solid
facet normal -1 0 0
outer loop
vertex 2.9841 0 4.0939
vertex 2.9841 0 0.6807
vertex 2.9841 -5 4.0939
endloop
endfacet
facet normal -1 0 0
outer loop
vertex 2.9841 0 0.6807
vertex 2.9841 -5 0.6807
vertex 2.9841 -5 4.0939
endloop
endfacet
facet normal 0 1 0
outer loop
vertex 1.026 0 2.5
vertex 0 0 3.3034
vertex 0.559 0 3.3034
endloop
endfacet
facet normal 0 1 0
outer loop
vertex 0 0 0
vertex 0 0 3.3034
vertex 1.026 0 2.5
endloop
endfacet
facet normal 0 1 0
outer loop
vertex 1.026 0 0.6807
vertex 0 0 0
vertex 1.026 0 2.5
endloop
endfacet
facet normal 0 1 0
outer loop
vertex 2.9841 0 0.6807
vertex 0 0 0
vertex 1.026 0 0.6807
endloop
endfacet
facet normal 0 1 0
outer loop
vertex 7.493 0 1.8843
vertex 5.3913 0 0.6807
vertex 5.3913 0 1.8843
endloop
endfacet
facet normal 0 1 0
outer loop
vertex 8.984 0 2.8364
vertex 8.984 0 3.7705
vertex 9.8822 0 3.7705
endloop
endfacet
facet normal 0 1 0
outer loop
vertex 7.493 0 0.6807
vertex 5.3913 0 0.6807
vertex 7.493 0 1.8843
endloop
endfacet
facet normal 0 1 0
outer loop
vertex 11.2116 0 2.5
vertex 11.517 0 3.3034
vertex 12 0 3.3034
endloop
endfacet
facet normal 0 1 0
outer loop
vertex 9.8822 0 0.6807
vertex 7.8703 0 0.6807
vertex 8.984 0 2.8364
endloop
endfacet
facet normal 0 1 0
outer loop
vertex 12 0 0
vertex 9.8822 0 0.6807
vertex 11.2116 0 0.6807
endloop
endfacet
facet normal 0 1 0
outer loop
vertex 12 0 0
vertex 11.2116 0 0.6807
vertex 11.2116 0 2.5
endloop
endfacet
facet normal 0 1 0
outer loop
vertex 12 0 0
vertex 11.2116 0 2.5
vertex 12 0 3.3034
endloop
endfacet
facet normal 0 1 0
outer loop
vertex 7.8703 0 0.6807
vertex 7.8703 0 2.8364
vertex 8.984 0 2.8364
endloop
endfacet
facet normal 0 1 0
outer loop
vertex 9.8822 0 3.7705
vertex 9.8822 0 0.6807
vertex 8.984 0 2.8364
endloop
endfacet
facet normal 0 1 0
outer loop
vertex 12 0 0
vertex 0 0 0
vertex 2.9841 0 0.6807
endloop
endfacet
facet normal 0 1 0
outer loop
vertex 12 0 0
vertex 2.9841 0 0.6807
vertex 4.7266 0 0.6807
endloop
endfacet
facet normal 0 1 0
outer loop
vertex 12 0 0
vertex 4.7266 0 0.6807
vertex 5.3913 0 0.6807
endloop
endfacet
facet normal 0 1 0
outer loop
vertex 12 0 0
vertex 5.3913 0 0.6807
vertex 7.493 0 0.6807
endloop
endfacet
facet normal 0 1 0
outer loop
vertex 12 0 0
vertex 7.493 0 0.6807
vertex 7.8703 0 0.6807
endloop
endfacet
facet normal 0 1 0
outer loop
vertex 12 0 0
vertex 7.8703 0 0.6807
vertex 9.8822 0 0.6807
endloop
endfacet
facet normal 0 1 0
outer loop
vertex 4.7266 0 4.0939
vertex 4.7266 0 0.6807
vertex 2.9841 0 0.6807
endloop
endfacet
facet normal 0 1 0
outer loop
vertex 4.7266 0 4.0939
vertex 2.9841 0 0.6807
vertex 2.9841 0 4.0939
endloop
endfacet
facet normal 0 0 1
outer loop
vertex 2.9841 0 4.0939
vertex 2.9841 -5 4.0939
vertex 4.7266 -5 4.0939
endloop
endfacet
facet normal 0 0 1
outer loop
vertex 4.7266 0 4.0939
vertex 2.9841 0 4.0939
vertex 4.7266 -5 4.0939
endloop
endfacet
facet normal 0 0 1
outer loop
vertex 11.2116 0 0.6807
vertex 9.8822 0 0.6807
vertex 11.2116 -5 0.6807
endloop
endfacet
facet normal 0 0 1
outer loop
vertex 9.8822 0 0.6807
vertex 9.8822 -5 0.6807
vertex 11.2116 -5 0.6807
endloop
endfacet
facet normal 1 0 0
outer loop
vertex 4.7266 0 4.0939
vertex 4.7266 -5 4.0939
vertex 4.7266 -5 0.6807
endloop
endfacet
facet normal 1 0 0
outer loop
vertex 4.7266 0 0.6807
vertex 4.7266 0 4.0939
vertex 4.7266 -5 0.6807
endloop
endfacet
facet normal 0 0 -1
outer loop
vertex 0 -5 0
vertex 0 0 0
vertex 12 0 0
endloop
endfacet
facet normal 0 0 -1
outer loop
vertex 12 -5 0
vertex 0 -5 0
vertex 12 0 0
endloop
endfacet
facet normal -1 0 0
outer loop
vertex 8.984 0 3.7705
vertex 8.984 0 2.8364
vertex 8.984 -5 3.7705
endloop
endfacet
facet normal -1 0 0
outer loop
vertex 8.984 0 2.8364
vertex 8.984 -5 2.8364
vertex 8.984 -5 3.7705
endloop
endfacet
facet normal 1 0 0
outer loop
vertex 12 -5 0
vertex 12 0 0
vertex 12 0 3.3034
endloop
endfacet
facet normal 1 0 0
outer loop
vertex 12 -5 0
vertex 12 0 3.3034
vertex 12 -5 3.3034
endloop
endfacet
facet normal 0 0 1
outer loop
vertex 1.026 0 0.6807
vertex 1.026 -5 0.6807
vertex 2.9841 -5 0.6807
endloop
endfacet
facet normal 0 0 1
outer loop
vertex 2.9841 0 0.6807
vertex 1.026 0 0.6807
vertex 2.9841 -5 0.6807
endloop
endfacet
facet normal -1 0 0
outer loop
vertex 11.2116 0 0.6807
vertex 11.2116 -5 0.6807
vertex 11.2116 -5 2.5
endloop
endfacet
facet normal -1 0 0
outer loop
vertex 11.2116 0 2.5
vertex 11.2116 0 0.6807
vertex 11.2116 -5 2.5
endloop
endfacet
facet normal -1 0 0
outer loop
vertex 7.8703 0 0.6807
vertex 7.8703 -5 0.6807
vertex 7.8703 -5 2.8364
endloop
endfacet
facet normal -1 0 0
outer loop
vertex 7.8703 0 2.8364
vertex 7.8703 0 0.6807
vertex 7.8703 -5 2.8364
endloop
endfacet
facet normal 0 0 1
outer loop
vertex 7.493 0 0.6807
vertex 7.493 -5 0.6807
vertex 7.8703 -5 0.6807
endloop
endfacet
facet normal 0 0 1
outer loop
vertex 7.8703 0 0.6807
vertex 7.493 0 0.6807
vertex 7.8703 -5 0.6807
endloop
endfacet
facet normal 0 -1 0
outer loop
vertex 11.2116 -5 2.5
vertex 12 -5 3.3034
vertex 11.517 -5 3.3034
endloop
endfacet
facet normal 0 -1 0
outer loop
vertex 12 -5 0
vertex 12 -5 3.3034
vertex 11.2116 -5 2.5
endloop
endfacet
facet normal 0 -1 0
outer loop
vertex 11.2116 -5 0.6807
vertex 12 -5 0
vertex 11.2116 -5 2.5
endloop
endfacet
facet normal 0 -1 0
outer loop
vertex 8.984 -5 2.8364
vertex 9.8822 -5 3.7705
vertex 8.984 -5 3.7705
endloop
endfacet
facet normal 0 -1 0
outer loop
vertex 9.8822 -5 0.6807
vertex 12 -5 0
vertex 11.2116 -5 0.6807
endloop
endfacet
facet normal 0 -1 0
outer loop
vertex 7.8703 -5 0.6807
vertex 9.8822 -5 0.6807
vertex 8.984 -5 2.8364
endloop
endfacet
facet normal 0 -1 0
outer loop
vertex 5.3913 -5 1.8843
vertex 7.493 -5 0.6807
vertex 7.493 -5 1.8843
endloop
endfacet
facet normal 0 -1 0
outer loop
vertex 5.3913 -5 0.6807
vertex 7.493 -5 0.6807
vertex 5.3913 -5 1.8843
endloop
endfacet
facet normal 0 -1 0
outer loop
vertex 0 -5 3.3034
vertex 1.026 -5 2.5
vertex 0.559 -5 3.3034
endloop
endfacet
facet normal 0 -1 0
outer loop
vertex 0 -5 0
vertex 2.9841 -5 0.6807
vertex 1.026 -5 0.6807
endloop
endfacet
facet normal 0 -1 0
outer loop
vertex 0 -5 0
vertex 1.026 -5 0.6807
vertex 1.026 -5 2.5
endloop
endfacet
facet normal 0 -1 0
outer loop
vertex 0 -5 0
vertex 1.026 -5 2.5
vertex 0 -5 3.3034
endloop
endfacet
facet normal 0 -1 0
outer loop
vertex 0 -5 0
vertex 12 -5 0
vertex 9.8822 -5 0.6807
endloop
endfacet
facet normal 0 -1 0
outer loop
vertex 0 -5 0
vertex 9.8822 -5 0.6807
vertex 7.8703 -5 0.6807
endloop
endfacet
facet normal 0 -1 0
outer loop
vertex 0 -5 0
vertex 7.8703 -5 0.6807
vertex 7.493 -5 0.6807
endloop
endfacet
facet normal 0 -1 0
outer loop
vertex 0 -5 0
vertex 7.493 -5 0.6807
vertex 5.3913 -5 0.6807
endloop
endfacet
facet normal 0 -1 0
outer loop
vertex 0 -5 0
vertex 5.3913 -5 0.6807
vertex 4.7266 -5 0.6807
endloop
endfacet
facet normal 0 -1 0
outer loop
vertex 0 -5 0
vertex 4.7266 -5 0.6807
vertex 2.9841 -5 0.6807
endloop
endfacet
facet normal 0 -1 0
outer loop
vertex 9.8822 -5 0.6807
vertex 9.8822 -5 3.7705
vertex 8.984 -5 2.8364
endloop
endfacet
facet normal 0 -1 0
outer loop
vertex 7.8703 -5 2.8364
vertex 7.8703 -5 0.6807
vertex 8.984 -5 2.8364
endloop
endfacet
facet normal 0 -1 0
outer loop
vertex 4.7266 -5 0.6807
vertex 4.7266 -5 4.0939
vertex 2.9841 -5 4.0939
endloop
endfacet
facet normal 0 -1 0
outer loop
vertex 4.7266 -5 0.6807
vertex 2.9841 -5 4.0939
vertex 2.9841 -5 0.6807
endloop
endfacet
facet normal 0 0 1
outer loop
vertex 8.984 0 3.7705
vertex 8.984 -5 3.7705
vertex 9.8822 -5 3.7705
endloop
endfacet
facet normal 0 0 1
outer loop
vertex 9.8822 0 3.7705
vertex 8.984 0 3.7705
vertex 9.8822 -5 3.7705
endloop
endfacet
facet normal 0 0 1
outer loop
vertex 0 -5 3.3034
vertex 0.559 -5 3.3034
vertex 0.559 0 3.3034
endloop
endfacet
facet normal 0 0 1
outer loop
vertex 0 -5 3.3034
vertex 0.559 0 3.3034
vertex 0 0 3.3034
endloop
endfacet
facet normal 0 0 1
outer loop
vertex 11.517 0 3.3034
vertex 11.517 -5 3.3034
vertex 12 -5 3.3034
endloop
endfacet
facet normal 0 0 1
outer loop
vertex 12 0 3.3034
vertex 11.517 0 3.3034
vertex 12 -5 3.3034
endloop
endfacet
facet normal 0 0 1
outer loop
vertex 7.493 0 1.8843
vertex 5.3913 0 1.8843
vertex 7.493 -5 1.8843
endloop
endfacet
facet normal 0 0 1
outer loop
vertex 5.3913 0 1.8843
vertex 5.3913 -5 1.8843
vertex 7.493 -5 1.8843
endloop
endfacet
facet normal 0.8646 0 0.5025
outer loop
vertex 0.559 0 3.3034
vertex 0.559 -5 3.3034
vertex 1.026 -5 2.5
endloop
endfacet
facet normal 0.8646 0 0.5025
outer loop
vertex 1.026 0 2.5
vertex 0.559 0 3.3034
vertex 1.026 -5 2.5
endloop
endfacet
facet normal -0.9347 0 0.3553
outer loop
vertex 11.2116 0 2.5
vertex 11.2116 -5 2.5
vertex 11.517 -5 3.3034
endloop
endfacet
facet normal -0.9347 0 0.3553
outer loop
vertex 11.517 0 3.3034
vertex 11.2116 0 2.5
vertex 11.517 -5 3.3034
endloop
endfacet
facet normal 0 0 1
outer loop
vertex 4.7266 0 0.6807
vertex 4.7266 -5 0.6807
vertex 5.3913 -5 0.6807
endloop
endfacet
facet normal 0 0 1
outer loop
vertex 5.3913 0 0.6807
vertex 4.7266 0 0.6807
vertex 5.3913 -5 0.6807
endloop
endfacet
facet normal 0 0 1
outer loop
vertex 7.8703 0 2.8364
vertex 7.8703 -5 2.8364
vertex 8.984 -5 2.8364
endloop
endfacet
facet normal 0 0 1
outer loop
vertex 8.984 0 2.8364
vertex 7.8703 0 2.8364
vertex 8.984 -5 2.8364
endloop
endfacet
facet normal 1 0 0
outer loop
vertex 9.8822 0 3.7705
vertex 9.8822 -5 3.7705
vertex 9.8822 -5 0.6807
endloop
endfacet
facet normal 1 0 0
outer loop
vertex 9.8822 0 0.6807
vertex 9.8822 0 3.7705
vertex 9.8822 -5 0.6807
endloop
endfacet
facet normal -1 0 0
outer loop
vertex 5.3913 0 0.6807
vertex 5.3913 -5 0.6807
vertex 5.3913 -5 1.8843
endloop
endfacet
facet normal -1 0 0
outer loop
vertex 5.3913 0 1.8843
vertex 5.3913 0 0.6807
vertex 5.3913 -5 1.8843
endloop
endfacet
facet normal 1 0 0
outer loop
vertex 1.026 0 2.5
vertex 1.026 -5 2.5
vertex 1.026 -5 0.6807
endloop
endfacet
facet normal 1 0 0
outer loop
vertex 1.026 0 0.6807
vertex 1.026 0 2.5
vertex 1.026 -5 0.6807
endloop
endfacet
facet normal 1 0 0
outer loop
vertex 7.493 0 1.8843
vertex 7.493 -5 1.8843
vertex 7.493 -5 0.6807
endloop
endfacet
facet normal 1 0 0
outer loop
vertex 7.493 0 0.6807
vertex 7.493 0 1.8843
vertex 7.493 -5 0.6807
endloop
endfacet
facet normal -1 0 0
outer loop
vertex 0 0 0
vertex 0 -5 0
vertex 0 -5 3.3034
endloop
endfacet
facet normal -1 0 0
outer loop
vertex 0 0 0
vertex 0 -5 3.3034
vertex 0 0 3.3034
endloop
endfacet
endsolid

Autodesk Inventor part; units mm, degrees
ref_plane "YZ Plane" through (0, 0, 0) normal (1, 0, 0) x (0, 1, 0)
ref_plane "XZ Plane" through (0, 0, 0) normal (0, 1, 0) x (-1, 0, 0)
ref_plane "XY Plane" through (0, 0, 0) normal (0, 0, 1) x (1, 0, 0)
sketch "Эскиз1" plane through (0, 0, 0) normal (0, 0, 1) x (1, 0, 0)
  line L0 (0, 0) -> (12, 0)
  line L1 (12, 0) -> (12, -5)
  line L2 (12, -5) -> (0, -5)
  line L3 (0, -5) -> (0, 0)
  dimension "d0" = 12
  dimension "d1" = 5
extrude "Выдавливание1" add sketch "Эскиз1" along normal blind 5
sketch "Эскиз2" plane through (0, -5, 0) normal (0, -1, 0) x (1, 0, 0)
  line L0 (0, 0) -> (0, 5) projected
  line L1 (0, 0.6807) -> (2.9841, 0.6807)
  line L2 (2.9841, 0.6807) -> (2.9841, 4.0939)
  line L3 (2.9841, 4.0939) -> (4.7266, 4.0939)
  line L4 (4.7266, 4.0939) -> (4.7266, 0.6807)
  line L5 (4.7266, 0.6807) -> (5.3913, 0.6807)
  line L6 (5.3913, 0.6807) -> (5.3913, 1.8843)
  line L7 (5.3913, 1.8843) -> (7.493, 1.8843)
  line L8 (7.493, 1.8843) -> (7.493, 0.6807)
  line L9 (7.493, 0.6807) -> (7.8703, 0.6807)
  line L10 (7.8703, 0.6807) -> (7.8703, 2.8364)
  line L11 (7.8703, 2.8364) -> (8.984, 2.8364)
  line L12 (8.984, 2.8364) -> (8.984, 3.7705)
  line L13 (8.984, 3.7705) -> (9.8822, 3.7705)
  line L14 (9.8822, 3.7705) -> (9.8822, 0.6807)
  line L15 (9.8822, 0.6807) -> (11.2116, 0.6807)
  line L16 (11.2116, 0.6807) -> (11.2116, 2.5)
  line L17 (11.2116, 2.5) -> (11.517, 3.3034)
  line L18 (11.517, 3.3034) -> (12, 3.3034)
  line L19 (12, 0) -> (12, 5) projected
  line L20 (0, 0) -> (12, 0) projected
  line L21 (12, 3.3034) -> (12, 0)
  line L22 (12, 0) -> (0, 0)
  line L23 (0, 0.6807) -> (0, 3.3034)
  line L24 (0.559, 3.3034) -> (1.026, 2.5)
  line L25 (1.026, 2.5) -> (1.026, 0.6807)
  line L26 (0.559, 3.3034) -> (0, 3.3034)
extrude "Выдавливание2" cut sketch "Эскиз2" against normal blind 5 keep common part
properties part number "Преобразователь напряжения"
